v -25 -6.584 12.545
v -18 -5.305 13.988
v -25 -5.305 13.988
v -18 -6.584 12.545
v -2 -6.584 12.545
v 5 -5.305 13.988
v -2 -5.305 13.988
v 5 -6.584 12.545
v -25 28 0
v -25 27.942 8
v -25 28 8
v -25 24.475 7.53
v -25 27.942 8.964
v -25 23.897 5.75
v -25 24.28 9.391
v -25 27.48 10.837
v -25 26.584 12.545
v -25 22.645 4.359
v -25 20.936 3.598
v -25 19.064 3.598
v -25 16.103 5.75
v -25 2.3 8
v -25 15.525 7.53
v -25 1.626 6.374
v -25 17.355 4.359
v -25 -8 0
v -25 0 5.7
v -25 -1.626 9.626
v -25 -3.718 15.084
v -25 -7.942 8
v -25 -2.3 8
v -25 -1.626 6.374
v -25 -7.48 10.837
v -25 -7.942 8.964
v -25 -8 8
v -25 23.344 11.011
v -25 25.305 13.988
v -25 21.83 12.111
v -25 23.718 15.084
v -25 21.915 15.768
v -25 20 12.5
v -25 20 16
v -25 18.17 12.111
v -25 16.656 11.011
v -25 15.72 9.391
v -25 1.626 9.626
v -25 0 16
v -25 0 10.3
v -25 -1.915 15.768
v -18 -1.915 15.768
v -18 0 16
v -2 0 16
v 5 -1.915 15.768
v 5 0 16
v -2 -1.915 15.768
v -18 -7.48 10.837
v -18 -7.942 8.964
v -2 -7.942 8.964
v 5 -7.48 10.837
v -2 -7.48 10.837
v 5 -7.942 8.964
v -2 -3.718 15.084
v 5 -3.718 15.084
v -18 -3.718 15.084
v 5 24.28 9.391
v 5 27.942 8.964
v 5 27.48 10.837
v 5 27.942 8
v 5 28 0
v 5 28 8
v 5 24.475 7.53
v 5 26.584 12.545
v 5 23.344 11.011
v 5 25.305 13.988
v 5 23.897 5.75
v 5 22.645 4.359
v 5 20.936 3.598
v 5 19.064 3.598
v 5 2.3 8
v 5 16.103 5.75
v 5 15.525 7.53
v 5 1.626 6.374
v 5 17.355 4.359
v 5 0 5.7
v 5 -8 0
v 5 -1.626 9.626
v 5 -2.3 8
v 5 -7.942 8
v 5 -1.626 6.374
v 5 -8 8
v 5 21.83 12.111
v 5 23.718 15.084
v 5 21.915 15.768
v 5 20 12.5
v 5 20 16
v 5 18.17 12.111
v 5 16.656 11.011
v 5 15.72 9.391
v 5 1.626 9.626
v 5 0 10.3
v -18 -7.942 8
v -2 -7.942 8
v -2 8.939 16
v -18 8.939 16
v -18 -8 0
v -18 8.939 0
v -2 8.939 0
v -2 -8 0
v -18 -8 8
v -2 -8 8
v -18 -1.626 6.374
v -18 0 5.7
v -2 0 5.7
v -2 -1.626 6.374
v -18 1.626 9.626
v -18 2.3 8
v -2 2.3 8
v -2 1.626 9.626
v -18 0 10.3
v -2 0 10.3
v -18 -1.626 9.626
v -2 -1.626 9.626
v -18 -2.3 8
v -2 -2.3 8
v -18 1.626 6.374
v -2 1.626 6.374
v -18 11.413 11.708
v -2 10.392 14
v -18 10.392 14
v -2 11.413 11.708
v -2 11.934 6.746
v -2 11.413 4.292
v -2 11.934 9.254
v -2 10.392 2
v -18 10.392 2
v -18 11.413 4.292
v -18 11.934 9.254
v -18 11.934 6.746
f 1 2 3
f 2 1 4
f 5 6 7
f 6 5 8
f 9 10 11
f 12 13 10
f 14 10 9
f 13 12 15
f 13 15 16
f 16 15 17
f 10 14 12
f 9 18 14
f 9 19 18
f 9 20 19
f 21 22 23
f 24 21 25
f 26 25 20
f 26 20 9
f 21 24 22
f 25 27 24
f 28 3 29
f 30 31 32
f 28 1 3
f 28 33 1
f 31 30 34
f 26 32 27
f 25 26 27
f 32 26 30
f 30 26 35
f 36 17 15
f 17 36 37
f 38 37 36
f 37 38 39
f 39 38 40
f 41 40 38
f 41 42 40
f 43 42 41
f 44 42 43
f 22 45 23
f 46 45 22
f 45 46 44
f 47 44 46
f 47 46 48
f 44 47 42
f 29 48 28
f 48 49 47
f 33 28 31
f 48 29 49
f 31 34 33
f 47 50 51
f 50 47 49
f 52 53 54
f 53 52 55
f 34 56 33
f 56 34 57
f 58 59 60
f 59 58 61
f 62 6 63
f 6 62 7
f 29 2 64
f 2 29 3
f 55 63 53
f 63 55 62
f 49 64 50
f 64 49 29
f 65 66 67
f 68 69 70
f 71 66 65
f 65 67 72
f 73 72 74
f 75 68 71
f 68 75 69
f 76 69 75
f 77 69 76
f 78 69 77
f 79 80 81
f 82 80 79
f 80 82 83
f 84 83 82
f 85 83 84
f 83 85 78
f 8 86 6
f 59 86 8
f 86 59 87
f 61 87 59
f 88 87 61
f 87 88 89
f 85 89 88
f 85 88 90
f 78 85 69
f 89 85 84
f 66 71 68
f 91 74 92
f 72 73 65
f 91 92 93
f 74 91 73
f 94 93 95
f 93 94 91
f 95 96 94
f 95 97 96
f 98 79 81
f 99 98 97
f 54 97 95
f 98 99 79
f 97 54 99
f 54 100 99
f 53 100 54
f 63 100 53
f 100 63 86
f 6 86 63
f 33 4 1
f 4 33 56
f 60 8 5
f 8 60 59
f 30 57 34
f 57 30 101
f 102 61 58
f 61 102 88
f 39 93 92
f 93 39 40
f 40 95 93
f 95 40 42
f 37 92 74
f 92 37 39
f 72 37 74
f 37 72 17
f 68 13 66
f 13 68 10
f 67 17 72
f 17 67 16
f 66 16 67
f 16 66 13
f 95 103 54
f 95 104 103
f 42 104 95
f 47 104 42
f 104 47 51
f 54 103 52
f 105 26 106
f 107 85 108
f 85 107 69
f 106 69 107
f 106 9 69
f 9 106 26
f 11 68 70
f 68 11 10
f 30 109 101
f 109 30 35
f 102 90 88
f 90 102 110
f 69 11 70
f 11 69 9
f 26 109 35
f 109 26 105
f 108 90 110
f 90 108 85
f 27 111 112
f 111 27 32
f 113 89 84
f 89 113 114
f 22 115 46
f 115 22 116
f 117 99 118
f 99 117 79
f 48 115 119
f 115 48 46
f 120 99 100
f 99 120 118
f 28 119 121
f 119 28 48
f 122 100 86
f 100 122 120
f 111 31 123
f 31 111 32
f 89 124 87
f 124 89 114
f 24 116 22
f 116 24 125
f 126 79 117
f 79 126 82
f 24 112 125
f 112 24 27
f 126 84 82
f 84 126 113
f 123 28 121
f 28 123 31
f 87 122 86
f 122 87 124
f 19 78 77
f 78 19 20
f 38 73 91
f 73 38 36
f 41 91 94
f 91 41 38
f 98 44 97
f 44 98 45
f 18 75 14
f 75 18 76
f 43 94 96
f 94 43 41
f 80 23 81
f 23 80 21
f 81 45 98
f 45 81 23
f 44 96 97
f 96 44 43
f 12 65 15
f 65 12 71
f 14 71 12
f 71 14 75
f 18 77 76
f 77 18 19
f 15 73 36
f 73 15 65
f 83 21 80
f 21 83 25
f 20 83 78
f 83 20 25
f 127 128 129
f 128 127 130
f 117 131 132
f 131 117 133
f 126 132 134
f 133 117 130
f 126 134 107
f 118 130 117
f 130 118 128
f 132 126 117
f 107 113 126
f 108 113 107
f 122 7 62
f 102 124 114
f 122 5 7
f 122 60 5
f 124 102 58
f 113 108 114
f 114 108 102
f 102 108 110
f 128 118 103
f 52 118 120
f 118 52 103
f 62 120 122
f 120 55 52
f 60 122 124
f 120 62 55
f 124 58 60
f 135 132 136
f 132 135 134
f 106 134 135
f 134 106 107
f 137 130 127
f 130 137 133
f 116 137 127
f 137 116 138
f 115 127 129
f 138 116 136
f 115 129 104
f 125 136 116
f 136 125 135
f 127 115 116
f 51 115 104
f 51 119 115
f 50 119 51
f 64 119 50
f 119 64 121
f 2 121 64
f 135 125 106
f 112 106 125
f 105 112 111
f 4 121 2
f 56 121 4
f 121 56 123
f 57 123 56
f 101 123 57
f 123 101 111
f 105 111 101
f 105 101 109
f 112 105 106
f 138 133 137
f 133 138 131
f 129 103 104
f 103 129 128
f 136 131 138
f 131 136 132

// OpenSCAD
// PRUSA iteration3
// Y idler
// GNU GPL v3
// Josef Průša <iam@josefprusa.cz> and contributors
// http://www.reprap.org/wiki/Prusa_Mendel
// http://prusamendel.org


module y_idler_base(){
 translate(v = [0,0,-5]) cylinder(h = 30, r=8);	
 translate(v = [0,20,-5]) cylinder(h = 30, r=8);
 translate(v = [0,10,10]) cube(size = [16,20,30], center=true);
 translate(v = [-4,10,10]) cube(size = [8,16+20,30], center=true);
}

module y_idler_holes(){
 translate(v = [0,0,-10]) cylinder(h = 120, r=2.3);	
 translate(v = [0,20,-10]) cylinder(h = 120, r=4.5);
 translate(v = [0,0,2]) cylinder(h = 16, r=12);
}

// Final part
module y_idler(){
 translate(v = [0,0,8])rotate([0,-90,0]) difference(){
  y_idler_base();
  y_idler_holes();
 }
}

y_idler();
